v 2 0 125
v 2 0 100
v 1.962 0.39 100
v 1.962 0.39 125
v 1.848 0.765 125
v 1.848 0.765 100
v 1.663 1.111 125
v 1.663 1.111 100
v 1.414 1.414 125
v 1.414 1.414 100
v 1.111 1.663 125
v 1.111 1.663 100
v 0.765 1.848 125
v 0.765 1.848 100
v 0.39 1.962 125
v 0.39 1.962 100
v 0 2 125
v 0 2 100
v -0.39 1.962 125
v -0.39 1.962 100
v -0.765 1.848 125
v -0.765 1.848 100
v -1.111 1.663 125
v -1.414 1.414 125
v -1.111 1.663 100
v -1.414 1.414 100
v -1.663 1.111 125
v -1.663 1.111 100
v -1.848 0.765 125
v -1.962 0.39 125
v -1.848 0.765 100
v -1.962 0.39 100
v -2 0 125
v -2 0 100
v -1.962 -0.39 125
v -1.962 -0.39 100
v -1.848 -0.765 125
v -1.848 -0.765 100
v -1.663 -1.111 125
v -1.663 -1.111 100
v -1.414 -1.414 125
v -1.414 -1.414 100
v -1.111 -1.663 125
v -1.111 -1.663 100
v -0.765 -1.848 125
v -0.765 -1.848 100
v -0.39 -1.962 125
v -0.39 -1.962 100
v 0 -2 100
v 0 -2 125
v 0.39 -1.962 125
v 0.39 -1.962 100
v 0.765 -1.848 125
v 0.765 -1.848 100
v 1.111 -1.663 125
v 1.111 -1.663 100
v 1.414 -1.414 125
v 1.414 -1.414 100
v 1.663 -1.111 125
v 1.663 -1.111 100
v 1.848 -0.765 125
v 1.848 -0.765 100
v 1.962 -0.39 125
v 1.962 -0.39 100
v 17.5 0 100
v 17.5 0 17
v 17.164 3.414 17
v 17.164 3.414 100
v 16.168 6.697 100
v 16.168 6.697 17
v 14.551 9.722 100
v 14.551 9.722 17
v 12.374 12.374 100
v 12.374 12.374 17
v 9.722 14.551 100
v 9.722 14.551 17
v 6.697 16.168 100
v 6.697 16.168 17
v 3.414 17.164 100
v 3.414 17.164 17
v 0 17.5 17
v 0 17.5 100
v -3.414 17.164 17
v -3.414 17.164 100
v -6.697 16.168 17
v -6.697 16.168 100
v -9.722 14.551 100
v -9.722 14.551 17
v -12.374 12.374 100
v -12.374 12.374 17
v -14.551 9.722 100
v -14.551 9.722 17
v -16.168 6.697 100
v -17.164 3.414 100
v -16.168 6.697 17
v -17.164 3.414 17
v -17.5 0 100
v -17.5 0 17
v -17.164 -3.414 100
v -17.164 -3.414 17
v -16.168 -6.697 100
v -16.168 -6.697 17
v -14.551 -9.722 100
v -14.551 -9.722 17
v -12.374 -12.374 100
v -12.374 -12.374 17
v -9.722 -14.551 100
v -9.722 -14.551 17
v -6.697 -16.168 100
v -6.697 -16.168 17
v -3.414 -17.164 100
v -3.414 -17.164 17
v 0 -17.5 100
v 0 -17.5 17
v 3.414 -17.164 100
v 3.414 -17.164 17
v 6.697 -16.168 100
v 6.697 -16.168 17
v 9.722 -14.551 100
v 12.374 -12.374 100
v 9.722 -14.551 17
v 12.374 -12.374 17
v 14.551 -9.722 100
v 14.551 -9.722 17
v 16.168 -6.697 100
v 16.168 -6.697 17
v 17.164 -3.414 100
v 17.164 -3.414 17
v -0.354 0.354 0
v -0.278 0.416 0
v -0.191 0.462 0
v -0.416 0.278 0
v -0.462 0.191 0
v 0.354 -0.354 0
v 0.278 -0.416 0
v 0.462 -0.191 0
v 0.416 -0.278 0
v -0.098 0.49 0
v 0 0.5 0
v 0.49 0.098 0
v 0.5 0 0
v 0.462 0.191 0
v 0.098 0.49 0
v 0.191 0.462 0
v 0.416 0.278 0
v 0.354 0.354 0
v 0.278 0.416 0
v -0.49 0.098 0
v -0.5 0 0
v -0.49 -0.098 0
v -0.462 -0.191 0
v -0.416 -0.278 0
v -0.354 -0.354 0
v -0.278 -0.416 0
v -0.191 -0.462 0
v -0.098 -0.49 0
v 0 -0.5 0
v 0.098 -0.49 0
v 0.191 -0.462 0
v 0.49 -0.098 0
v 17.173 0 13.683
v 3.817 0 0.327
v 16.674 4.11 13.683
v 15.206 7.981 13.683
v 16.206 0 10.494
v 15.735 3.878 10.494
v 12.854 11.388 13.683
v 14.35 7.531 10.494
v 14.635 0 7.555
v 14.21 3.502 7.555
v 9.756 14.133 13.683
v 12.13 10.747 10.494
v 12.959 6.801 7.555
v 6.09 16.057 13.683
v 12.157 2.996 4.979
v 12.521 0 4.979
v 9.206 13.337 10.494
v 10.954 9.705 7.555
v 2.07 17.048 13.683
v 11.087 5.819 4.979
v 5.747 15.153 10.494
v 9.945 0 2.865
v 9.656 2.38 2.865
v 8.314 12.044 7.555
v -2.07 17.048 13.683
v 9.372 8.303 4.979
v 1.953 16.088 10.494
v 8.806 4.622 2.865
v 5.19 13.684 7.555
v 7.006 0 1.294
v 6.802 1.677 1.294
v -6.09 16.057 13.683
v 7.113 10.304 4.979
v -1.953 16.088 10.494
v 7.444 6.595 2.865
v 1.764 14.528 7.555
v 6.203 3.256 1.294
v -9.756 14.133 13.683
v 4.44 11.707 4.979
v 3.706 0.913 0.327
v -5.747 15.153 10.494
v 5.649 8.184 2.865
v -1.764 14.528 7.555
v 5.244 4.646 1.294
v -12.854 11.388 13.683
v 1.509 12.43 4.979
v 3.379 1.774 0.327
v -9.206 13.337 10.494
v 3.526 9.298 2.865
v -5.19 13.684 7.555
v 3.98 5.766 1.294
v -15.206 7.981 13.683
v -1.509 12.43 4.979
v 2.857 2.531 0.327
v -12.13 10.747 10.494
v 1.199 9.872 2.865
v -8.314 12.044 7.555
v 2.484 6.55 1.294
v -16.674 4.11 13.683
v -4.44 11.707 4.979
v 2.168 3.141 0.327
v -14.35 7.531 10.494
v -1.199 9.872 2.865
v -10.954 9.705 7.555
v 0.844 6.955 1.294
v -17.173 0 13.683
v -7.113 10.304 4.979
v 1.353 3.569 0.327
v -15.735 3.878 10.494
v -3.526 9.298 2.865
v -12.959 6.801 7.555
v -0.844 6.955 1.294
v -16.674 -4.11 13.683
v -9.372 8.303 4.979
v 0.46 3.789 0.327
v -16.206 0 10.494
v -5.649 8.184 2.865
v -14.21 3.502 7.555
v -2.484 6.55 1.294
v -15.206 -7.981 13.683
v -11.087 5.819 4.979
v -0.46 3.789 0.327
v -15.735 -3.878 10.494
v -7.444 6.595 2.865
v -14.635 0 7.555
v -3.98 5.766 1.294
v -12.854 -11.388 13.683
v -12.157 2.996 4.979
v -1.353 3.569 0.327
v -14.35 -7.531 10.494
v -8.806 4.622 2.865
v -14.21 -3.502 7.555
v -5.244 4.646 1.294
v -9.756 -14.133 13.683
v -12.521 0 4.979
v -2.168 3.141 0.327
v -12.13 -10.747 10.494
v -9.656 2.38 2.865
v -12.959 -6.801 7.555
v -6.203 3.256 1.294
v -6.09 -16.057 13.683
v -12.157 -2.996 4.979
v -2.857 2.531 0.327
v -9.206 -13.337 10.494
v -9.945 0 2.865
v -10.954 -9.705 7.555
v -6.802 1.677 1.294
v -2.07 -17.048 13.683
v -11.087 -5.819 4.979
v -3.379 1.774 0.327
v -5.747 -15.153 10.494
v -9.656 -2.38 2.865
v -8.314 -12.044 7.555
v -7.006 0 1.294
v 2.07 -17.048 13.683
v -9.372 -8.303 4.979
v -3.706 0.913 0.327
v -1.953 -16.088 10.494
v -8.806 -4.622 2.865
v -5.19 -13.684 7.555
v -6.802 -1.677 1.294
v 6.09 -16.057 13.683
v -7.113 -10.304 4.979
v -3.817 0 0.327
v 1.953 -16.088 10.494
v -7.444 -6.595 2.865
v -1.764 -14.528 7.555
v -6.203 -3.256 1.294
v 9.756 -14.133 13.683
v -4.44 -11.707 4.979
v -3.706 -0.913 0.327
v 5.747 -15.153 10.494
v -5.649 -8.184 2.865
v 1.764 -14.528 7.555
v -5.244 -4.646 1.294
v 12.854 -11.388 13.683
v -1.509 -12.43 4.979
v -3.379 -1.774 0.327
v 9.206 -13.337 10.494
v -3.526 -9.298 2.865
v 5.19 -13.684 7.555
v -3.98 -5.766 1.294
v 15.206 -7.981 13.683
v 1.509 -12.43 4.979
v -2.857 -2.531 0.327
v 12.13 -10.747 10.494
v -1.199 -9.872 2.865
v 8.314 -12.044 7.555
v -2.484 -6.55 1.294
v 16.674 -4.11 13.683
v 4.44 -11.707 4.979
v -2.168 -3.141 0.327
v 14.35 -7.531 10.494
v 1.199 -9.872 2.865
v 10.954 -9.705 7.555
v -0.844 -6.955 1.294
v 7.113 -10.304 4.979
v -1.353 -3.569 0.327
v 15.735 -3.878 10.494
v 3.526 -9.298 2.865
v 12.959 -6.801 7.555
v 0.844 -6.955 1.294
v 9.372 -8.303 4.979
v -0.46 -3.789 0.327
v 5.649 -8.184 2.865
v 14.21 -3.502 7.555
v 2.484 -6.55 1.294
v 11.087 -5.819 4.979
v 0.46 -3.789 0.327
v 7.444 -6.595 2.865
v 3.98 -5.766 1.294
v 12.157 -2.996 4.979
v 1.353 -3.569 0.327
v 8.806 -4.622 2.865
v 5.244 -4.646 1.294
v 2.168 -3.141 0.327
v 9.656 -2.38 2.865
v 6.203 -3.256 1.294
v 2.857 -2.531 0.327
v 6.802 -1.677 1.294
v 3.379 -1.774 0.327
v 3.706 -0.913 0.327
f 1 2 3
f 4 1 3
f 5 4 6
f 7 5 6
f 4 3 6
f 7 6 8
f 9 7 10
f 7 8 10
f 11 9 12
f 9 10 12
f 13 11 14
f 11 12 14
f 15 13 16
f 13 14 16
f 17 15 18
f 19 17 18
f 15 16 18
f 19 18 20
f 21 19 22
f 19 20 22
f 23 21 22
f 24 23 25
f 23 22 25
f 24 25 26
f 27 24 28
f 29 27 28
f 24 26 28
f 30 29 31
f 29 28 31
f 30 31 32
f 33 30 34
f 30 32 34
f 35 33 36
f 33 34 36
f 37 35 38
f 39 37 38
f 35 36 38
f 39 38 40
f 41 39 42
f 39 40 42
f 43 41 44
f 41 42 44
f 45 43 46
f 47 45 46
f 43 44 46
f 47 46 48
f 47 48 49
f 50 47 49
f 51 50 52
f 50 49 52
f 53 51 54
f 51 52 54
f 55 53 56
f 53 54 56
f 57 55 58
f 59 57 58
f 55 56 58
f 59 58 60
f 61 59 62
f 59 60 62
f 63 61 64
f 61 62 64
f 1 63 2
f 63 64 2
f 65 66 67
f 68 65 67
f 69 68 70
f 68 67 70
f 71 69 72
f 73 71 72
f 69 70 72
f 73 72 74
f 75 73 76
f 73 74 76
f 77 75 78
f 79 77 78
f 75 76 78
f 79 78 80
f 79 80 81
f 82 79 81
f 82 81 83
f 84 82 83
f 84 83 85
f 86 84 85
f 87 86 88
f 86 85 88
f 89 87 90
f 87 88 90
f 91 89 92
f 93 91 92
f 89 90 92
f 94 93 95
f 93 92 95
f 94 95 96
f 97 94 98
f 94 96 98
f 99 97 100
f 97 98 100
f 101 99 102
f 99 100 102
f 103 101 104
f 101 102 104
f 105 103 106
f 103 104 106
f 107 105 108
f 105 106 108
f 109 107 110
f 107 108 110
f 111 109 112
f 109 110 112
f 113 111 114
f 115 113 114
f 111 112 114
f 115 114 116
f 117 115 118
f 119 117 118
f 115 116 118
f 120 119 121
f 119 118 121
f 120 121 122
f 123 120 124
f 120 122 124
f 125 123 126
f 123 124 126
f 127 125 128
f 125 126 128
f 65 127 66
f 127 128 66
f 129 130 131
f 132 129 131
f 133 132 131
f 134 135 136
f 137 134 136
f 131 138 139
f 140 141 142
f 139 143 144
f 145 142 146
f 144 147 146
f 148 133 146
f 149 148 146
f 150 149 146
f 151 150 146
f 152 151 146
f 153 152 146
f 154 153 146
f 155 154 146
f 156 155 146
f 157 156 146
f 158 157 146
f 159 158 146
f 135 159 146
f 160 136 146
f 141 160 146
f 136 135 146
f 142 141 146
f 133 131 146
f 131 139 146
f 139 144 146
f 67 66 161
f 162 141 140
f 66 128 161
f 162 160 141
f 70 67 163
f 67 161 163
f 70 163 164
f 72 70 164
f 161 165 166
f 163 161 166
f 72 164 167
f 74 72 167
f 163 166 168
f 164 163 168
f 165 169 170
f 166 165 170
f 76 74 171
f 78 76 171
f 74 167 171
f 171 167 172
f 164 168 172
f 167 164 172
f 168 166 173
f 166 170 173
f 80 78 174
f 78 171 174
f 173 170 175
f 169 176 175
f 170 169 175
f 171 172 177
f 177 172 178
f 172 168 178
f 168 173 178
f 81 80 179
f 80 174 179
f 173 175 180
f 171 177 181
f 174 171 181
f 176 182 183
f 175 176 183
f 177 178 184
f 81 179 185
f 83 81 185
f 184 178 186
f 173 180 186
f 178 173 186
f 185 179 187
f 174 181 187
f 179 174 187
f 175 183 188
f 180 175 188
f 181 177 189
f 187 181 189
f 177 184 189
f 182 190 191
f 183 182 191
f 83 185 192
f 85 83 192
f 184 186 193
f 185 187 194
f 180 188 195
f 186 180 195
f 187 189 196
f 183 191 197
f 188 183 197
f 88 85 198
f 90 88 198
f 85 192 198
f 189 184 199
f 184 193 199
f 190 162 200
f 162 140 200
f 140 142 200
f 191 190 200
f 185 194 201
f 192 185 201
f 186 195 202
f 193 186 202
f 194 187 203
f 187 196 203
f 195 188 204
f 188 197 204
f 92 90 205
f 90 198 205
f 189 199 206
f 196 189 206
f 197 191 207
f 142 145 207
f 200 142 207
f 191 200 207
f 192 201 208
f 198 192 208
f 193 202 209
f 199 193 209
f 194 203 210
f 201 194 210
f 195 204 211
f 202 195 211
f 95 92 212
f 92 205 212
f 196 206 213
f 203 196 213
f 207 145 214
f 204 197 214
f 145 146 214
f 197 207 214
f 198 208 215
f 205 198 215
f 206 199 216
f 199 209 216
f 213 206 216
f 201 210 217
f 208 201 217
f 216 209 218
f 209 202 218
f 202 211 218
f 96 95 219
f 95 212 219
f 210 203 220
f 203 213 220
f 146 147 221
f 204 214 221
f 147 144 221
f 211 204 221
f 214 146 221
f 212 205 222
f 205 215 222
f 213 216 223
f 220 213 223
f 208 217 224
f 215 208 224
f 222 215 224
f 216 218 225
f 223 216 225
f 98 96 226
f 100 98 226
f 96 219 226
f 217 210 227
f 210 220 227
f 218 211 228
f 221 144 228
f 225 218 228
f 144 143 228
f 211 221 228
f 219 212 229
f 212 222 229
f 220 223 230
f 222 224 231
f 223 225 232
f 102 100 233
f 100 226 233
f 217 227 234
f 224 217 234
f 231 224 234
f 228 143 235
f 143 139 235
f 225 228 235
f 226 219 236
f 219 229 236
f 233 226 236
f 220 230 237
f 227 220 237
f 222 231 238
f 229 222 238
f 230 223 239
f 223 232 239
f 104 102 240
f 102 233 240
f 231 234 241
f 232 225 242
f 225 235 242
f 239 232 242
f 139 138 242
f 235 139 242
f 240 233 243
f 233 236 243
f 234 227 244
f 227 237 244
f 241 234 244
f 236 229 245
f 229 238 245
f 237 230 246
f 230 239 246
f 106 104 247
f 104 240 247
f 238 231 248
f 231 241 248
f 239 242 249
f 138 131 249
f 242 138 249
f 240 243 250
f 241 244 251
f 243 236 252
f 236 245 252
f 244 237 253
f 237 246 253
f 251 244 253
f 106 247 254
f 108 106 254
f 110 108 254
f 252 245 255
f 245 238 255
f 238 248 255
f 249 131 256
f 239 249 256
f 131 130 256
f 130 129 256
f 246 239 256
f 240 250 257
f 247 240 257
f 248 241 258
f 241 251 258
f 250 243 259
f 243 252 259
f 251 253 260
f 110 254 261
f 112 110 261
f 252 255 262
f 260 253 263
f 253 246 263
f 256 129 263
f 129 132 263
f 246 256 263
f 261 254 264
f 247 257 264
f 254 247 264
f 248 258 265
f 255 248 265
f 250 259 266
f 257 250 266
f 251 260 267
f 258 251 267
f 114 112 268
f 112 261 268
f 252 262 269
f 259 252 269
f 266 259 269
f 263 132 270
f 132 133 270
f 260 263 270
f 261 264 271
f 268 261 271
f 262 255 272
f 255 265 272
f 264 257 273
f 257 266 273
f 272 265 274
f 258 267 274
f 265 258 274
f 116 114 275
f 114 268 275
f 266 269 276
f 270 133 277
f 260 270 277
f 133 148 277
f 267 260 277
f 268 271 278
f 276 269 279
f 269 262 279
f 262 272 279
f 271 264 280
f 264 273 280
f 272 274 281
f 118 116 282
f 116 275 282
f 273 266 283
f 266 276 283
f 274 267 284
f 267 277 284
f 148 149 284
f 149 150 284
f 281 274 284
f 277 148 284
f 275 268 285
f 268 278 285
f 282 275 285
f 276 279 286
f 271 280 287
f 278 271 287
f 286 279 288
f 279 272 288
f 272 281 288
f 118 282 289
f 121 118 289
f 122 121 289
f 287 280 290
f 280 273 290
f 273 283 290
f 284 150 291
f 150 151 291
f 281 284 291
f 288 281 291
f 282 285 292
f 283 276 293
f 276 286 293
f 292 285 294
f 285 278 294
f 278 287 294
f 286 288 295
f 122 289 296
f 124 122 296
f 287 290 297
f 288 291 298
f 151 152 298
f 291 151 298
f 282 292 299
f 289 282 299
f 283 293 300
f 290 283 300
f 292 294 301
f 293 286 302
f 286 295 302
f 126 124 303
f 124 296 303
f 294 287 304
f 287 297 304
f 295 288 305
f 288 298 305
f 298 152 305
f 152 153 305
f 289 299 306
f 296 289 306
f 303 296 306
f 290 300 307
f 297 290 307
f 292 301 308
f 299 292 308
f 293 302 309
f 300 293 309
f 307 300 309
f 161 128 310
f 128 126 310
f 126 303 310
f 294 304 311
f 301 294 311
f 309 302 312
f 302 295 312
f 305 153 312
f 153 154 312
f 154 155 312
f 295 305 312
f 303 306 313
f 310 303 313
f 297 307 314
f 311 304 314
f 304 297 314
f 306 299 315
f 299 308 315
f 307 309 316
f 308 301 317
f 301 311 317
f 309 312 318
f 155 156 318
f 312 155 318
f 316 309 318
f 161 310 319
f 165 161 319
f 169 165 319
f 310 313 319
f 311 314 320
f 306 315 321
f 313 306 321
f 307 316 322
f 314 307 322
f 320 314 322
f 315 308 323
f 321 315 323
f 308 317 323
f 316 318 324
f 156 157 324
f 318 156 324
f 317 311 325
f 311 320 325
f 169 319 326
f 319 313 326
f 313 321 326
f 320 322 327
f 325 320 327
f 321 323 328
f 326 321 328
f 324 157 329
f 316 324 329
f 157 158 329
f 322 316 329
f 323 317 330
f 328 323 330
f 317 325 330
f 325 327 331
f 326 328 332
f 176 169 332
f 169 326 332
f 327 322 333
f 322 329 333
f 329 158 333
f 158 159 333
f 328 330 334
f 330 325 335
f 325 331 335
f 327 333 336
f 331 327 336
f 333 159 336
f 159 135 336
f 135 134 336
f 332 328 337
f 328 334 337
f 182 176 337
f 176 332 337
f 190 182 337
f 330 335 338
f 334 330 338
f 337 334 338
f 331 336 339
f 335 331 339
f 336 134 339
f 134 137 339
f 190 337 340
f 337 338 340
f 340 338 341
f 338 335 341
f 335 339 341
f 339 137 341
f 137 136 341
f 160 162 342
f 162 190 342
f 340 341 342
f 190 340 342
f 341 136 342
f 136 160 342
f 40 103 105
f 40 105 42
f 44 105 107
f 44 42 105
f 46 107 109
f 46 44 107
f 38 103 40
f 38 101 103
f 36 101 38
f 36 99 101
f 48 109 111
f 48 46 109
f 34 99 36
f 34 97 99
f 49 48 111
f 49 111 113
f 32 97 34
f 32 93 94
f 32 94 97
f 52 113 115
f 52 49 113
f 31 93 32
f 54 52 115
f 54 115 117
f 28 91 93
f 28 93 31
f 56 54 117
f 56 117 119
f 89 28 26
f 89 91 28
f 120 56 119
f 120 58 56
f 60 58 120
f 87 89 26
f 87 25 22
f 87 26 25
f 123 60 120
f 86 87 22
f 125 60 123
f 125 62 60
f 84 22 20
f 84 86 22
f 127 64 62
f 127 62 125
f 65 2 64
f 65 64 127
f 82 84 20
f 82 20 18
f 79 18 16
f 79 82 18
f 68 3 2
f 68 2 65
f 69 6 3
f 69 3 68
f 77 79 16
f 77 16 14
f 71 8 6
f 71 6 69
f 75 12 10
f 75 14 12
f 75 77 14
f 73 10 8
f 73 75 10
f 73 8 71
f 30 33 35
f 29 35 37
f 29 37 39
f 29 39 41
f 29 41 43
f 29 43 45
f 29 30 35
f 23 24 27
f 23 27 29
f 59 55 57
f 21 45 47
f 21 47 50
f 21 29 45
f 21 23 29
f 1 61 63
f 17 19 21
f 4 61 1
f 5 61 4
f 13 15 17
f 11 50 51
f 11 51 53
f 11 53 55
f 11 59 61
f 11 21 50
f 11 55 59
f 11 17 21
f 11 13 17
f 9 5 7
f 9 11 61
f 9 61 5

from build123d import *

# Parameters (mm, degrees)
ESQUISSE1_R        = 17.5
BOSS_EXTRU_1_DEPTH = 100
CONG_1_R           = 17
ESQUISSE2_R        = 2
BOSS_EXTRU_2_DEPTH = 25


with BuildPart() as part:
    # Esquisse1 → Boss.-Extru.1 (new body)
    with BuildSketch(Plane.XY):
        Circle(ESQUISSE1_R)
    extrude(amount=BOSS_EXTRU_1_DEPTH)

    # Congé1
    cong_1_edges = [part.edges().sort_by_distance(p)[0] for p in [
        (-17.5, 0, 0),
    ]]
    fillet(cong_1_edges, radius=CONG_1_R)

    # Esquisse2 → Boss.-Extru.2 (add)
    with BuildSketch(Plane.XY.offset(100)):
        Circle(ESQUISSE2_R)
    extrude(amount=BOSS_EXTRU_2_DEPTH)


solid = part.part
